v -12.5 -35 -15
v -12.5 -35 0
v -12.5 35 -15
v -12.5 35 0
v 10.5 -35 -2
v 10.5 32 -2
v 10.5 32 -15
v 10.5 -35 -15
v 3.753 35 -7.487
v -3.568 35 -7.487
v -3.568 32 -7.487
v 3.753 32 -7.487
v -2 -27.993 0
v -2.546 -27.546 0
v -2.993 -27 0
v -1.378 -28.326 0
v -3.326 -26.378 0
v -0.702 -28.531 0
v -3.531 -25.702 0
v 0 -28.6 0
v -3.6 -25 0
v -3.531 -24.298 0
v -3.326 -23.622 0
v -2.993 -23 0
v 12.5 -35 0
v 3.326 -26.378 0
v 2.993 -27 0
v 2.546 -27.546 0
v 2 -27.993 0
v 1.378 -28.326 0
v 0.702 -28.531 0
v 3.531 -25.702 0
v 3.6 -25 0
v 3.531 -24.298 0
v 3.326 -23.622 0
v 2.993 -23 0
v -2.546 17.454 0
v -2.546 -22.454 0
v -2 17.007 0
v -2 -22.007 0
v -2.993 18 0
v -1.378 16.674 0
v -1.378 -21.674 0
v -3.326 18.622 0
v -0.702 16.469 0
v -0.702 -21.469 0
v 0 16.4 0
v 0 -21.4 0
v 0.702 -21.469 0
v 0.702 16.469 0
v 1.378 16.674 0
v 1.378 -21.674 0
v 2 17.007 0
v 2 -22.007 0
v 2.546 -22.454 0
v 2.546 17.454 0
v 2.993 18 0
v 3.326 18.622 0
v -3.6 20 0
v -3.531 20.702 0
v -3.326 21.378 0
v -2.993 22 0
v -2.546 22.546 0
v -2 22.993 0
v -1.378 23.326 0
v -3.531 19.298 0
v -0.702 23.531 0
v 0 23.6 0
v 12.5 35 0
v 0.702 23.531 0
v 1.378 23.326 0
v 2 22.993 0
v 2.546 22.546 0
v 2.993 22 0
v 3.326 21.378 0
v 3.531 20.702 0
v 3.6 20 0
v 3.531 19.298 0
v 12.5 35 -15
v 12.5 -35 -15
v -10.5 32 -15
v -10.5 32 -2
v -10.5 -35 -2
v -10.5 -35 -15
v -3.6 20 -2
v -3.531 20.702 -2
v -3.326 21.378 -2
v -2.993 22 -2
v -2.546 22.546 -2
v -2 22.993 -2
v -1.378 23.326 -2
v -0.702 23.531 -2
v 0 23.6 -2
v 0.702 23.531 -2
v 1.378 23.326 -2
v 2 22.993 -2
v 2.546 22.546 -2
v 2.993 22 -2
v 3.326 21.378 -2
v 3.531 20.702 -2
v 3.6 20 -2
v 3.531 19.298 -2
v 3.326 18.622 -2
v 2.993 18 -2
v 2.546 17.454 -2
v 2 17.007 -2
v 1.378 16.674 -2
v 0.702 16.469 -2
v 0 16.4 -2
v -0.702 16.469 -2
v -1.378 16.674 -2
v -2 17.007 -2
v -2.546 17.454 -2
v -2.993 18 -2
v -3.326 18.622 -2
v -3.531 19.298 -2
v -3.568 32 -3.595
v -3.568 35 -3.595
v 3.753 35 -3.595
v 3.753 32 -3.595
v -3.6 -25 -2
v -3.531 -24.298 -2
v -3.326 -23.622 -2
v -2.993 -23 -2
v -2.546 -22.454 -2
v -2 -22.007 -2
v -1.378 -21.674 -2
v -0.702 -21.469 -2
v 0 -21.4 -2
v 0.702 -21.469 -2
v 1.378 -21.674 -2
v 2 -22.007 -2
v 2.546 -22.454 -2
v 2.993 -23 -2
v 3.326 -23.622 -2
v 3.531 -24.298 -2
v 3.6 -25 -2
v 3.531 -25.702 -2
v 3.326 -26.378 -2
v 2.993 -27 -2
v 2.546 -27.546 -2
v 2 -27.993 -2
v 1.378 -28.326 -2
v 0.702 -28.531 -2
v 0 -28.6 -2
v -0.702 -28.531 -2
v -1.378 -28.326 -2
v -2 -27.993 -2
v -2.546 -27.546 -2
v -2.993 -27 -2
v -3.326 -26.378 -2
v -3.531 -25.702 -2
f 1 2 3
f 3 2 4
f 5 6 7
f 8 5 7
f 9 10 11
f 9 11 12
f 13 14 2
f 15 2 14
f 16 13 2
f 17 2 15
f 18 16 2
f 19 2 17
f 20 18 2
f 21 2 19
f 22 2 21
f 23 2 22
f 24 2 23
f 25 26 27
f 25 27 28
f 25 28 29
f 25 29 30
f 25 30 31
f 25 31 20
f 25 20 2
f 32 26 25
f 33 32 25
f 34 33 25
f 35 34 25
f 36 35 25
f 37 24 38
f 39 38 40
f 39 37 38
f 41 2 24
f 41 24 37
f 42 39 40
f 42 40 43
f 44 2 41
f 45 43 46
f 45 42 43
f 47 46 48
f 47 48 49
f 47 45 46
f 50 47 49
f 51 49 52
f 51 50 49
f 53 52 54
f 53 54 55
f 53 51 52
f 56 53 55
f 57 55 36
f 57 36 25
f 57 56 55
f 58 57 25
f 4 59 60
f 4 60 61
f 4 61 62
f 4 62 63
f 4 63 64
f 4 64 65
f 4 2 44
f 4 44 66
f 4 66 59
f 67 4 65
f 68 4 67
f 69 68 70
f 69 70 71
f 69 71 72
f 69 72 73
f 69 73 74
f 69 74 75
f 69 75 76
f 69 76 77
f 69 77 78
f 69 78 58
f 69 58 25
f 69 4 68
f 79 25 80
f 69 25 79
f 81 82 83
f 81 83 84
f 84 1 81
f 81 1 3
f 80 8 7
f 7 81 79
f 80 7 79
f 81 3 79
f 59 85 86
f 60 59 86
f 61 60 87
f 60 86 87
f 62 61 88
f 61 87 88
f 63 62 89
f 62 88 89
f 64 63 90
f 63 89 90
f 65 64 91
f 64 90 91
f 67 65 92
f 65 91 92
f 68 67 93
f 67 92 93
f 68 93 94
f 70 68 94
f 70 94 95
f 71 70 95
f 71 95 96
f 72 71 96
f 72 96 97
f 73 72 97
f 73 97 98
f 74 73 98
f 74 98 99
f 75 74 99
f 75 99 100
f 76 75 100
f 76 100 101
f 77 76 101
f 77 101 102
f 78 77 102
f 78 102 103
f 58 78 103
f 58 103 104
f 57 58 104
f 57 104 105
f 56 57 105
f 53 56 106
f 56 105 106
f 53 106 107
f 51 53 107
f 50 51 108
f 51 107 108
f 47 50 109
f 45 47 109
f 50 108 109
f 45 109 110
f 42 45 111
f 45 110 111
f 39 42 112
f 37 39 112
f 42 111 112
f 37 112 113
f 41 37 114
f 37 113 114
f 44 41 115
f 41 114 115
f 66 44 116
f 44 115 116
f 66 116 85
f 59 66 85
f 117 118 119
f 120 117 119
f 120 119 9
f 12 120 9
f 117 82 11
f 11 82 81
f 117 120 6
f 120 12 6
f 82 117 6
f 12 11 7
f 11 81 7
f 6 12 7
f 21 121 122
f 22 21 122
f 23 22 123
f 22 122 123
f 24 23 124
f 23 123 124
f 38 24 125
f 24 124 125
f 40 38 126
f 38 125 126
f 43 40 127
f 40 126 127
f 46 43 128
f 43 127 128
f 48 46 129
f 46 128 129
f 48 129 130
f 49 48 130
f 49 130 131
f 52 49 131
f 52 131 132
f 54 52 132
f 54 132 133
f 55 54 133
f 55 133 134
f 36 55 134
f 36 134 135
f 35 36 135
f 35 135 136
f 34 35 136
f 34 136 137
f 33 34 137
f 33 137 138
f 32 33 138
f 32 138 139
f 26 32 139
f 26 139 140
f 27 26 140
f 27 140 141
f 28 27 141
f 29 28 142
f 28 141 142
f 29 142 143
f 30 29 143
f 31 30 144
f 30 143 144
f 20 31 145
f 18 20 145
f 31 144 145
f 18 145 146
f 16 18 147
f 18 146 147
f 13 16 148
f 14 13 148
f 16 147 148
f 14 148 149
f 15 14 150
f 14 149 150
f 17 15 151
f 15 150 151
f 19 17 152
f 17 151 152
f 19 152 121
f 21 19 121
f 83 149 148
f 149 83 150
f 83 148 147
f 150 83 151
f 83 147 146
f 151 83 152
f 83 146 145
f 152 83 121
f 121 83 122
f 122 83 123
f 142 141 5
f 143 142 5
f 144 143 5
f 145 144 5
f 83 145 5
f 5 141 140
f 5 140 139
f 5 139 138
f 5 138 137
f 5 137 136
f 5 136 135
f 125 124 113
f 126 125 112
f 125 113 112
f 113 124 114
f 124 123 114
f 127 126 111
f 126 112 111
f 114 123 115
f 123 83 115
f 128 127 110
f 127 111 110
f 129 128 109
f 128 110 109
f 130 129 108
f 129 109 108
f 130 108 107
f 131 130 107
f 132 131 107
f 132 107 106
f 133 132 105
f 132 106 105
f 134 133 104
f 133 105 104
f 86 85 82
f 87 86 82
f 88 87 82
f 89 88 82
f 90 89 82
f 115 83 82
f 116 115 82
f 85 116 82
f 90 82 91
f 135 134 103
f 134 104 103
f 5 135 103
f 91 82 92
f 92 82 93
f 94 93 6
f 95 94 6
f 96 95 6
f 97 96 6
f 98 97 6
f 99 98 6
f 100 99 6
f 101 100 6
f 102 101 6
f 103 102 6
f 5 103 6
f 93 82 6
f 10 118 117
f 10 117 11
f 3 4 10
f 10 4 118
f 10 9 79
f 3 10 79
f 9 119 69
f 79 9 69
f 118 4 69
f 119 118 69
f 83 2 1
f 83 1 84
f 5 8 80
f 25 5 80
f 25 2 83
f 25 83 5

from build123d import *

# Parameters (mm, degrees)
SKETCH1_W           = 25
SKETCH1_H           = 70
BOSS_EXTRUDE1_DEPTH = 15
CUT_EXTRUDE1_REACH  = 74.672
SKETCH2_W           = 21
SKETCH2_H           = 13
SKETCH4_W           = 25
SKETCH4_H           = 15
SKETCH4_W_2         = 7.320869851
SKETCH4_H_2         = 3.892108022
BOSS_EXTRUDE2_DEPTH = 3
CUT_EXTRUDE3_REACH  = 41.373
SKETCH5_R           = 3.6


with BuildPart() as part:
    # Sketch1 → Boss-Extrude1 (new body)
    with BuildSketch(Plane.XY):
        Rectangle(SKETCH1_W, SKETCH1_H)
    extrude(amount=-BOSS_EXTRUDE1_DEPTH)

    # Sketch2 → Cut-Extrude1 (cut, up to next)
    with BuildSketch(Plane(origin=(0, 35, 0), x_dir=(1, 0, 0), z_dir=(0, 1, 0)), mode=Mode.PRIVATE) as cut_extrude1_sk1:
        with Locations((0, 8.5)):
            Rectangle(SKETCH2_W, SKETCH2_H)
    cut_extrude1_tool1 = extrude(cut_extrude1_sk1.sketch, amount=-CUT_EXTRUDE1_REACH, mode=Mode.PRIVATE) & part.part
    add(cut_extrude1_tool1.solids().sort_by_distance((0, 35, -8.5))[0], mode=Mode.SUBTRACT)

    # Sketch4 → Boss-Extrude2 (add)
    with BuildSketch(Plane(origin=(0, 35, 0), x_dir=(1, 0, 0), z_dir=(0, 1, 0))):
        with Locations((0, 7.5)):
            Rectangle(SKETCH4_W, SKETCH4_H)
        with Locations((0.092669239, 5.540570559)):
            Rectangle(SKETCH4_W_2, SKETCH4_H_2, mode=Mode.SUBTRACT)
    extrude(amount=-BOSS_EXTRUDE2_DEPTH)

    # Sketch5 → Cut-Extrude3 (cut, up to next)
    with BuildSketch(Plane(origin=(0, 0, -2), x_dir=(-1, 0, 0), z_dir=(0, 0, -1)), mode=Mode.PRIVATE) as cut_extrude3_sk1:
        with Locations((0, 20)):
            Circle(SKETCH5_R)
    cut_extrude3_tool1 = extrude(cut_extrude3_sk1.sketch, amount=-CUT_EXTRUDE3_REACH, mode=Mode.PRIVATE) & part.part
    # Sketch5 → Cut-Extrude3 (cut, up to next)
    with BuildSketch(Plane(origin=(0, 0, -2), x_dir=(-1, 0, 0), z_dir=(0, 0, -1)), mode=Mode.PRIVATE) as cut_extrude3_sk2:
        with Locations((0, -25)):
            Circle(SKETCH5_R)
    cut_extrude3_tool2 = extrude(cut_extrude3_sk2.sketch, amount=-CUT_EXTRUDE3_REACH, mode=Mode.PRIVATE) & part.part
    add(cut_extrude3_tool1.solids().sort_by_distance((0, 20, -2))[0], mode=Mode.SUBTRACT)
    add(cut_extrude3_tool2.solids().sort_by_distance((0, -25, -2))[0], mode=Mode.SUBTRACT)


solid = part.part
